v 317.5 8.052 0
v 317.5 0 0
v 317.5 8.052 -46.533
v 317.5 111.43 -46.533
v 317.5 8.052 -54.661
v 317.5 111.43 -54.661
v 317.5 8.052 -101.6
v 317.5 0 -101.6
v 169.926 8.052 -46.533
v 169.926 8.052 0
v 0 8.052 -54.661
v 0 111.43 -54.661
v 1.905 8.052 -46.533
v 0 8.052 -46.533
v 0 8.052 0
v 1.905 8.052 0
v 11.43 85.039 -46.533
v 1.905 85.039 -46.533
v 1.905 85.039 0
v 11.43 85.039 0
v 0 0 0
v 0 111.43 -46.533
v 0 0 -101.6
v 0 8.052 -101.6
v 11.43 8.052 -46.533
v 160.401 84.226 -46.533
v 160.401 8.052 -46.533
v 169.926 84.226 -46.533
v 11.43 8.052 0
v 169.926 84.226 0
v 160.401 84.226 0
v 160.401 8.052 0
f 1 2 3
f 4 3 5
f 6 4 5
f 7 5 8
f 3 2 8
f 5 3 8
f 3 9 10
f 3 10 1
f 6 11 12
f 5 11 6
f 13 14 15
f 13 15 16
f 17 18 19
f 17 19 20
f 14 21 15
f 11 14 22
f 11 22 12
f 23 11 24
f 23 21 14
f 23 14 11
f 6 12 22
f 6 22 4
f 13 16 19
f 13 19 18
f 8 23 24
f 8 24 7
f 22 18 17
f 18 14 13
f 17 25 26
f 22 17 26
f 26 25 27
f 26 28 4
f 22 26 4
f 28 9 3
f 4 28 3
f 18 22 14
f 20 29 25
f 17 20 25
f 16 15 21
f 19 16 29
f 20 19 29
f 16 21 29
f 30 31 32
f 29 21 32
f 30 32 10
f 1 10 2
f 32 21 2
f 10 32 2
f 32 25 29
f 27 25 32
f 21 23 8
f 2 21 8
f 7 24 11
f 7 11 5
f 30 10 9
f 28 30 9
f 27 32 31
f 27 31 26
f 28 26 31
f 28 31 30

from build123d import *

# Parameters (mm, degrees)
SKETCH1_W           = 317.5
SKETCH1_H           = 101.6
BOSS_EXTRUDE1_DEPTH = 8.0518
BOSS_EXTRUDE2_START = 8.0518
SKETCH2_W           = 317.5
SKETCH2_H           = 8.128
BOSS_EXTRUDE2_DEPTH = 103.378
BOSS_EXTRUDE3_START = 8.0518
SKETCH3_W           = 9.525
SKETCH3_H           = 46.5328
BOSS_EXTRUDE3_DEPTH = 76.9874
BOSS_EXTRUDE4_START = 8.0518
SKETCH3_3_W         = 9.525
SKETCH3_3_H         = 46.5328
BOSS_EXTRUDE4_DEPTH = 76.1746


with BuildPart() as part:
    # Sketch1 → Boss-Extrude1 (new body)
    with BuildSketch(Plane(origin=(0, 0, 0), x_dir=(1, 0, 0), z_dir=(0, 1, 0))):
        with Locations((158.75, 50.8)):
            Rectangle(SKETCH1_W, SKETCH1_H)
    extrude(amount=BOSS_EXTRUDE1_DEPTH)

    # Sketch2 → Boss-Extrude2 (add)
    with BuildSketch(Plane(origin=(0, 0, 0), x_dir=(1, 0, 0), z_dir=(0, 1, 0)).offset(BOSS_EXTRUDE2_START)):
        with Locations((158.75, 50.5968)):
            Rectangle(SKETCH2_W, SKETCH2_H)
    extrude(amount=BOSS_EXTRUDE2_DEPTH)

    # Sketch3 → Boss-Extrude3 (add)
    with BuildSketch(Plane(origin=(0, 0, 0), x_dir=(1, 0, 0), z_dir=(0, 1, 0)).offset(BOSS_EXTRUDE3_START)):
        with Locations((6.6675, 23.2664)):
            Rectangle(SKETCH3_W, SKETCH3_H)
    extrude(amount=BOSS_EXTRUDE3_DEPTH)

    # Sketch3<3> → Boss-Extrude4 (add)
    with BuildSketch(Plane(origin=(0, 0, 0), x_dir=(1, 0, 0), z_dir=(0, 1, 0)).offset(BOSS_EXTRUDE4_START)):
        with Locations((165.1635, 23.2664)):
            Rectangle(SKETCH3_3_W, SKETCH3_3_H)
    extrude(amount=BOSS_EXTRUDE4_DEPTH)


solid = part.part
